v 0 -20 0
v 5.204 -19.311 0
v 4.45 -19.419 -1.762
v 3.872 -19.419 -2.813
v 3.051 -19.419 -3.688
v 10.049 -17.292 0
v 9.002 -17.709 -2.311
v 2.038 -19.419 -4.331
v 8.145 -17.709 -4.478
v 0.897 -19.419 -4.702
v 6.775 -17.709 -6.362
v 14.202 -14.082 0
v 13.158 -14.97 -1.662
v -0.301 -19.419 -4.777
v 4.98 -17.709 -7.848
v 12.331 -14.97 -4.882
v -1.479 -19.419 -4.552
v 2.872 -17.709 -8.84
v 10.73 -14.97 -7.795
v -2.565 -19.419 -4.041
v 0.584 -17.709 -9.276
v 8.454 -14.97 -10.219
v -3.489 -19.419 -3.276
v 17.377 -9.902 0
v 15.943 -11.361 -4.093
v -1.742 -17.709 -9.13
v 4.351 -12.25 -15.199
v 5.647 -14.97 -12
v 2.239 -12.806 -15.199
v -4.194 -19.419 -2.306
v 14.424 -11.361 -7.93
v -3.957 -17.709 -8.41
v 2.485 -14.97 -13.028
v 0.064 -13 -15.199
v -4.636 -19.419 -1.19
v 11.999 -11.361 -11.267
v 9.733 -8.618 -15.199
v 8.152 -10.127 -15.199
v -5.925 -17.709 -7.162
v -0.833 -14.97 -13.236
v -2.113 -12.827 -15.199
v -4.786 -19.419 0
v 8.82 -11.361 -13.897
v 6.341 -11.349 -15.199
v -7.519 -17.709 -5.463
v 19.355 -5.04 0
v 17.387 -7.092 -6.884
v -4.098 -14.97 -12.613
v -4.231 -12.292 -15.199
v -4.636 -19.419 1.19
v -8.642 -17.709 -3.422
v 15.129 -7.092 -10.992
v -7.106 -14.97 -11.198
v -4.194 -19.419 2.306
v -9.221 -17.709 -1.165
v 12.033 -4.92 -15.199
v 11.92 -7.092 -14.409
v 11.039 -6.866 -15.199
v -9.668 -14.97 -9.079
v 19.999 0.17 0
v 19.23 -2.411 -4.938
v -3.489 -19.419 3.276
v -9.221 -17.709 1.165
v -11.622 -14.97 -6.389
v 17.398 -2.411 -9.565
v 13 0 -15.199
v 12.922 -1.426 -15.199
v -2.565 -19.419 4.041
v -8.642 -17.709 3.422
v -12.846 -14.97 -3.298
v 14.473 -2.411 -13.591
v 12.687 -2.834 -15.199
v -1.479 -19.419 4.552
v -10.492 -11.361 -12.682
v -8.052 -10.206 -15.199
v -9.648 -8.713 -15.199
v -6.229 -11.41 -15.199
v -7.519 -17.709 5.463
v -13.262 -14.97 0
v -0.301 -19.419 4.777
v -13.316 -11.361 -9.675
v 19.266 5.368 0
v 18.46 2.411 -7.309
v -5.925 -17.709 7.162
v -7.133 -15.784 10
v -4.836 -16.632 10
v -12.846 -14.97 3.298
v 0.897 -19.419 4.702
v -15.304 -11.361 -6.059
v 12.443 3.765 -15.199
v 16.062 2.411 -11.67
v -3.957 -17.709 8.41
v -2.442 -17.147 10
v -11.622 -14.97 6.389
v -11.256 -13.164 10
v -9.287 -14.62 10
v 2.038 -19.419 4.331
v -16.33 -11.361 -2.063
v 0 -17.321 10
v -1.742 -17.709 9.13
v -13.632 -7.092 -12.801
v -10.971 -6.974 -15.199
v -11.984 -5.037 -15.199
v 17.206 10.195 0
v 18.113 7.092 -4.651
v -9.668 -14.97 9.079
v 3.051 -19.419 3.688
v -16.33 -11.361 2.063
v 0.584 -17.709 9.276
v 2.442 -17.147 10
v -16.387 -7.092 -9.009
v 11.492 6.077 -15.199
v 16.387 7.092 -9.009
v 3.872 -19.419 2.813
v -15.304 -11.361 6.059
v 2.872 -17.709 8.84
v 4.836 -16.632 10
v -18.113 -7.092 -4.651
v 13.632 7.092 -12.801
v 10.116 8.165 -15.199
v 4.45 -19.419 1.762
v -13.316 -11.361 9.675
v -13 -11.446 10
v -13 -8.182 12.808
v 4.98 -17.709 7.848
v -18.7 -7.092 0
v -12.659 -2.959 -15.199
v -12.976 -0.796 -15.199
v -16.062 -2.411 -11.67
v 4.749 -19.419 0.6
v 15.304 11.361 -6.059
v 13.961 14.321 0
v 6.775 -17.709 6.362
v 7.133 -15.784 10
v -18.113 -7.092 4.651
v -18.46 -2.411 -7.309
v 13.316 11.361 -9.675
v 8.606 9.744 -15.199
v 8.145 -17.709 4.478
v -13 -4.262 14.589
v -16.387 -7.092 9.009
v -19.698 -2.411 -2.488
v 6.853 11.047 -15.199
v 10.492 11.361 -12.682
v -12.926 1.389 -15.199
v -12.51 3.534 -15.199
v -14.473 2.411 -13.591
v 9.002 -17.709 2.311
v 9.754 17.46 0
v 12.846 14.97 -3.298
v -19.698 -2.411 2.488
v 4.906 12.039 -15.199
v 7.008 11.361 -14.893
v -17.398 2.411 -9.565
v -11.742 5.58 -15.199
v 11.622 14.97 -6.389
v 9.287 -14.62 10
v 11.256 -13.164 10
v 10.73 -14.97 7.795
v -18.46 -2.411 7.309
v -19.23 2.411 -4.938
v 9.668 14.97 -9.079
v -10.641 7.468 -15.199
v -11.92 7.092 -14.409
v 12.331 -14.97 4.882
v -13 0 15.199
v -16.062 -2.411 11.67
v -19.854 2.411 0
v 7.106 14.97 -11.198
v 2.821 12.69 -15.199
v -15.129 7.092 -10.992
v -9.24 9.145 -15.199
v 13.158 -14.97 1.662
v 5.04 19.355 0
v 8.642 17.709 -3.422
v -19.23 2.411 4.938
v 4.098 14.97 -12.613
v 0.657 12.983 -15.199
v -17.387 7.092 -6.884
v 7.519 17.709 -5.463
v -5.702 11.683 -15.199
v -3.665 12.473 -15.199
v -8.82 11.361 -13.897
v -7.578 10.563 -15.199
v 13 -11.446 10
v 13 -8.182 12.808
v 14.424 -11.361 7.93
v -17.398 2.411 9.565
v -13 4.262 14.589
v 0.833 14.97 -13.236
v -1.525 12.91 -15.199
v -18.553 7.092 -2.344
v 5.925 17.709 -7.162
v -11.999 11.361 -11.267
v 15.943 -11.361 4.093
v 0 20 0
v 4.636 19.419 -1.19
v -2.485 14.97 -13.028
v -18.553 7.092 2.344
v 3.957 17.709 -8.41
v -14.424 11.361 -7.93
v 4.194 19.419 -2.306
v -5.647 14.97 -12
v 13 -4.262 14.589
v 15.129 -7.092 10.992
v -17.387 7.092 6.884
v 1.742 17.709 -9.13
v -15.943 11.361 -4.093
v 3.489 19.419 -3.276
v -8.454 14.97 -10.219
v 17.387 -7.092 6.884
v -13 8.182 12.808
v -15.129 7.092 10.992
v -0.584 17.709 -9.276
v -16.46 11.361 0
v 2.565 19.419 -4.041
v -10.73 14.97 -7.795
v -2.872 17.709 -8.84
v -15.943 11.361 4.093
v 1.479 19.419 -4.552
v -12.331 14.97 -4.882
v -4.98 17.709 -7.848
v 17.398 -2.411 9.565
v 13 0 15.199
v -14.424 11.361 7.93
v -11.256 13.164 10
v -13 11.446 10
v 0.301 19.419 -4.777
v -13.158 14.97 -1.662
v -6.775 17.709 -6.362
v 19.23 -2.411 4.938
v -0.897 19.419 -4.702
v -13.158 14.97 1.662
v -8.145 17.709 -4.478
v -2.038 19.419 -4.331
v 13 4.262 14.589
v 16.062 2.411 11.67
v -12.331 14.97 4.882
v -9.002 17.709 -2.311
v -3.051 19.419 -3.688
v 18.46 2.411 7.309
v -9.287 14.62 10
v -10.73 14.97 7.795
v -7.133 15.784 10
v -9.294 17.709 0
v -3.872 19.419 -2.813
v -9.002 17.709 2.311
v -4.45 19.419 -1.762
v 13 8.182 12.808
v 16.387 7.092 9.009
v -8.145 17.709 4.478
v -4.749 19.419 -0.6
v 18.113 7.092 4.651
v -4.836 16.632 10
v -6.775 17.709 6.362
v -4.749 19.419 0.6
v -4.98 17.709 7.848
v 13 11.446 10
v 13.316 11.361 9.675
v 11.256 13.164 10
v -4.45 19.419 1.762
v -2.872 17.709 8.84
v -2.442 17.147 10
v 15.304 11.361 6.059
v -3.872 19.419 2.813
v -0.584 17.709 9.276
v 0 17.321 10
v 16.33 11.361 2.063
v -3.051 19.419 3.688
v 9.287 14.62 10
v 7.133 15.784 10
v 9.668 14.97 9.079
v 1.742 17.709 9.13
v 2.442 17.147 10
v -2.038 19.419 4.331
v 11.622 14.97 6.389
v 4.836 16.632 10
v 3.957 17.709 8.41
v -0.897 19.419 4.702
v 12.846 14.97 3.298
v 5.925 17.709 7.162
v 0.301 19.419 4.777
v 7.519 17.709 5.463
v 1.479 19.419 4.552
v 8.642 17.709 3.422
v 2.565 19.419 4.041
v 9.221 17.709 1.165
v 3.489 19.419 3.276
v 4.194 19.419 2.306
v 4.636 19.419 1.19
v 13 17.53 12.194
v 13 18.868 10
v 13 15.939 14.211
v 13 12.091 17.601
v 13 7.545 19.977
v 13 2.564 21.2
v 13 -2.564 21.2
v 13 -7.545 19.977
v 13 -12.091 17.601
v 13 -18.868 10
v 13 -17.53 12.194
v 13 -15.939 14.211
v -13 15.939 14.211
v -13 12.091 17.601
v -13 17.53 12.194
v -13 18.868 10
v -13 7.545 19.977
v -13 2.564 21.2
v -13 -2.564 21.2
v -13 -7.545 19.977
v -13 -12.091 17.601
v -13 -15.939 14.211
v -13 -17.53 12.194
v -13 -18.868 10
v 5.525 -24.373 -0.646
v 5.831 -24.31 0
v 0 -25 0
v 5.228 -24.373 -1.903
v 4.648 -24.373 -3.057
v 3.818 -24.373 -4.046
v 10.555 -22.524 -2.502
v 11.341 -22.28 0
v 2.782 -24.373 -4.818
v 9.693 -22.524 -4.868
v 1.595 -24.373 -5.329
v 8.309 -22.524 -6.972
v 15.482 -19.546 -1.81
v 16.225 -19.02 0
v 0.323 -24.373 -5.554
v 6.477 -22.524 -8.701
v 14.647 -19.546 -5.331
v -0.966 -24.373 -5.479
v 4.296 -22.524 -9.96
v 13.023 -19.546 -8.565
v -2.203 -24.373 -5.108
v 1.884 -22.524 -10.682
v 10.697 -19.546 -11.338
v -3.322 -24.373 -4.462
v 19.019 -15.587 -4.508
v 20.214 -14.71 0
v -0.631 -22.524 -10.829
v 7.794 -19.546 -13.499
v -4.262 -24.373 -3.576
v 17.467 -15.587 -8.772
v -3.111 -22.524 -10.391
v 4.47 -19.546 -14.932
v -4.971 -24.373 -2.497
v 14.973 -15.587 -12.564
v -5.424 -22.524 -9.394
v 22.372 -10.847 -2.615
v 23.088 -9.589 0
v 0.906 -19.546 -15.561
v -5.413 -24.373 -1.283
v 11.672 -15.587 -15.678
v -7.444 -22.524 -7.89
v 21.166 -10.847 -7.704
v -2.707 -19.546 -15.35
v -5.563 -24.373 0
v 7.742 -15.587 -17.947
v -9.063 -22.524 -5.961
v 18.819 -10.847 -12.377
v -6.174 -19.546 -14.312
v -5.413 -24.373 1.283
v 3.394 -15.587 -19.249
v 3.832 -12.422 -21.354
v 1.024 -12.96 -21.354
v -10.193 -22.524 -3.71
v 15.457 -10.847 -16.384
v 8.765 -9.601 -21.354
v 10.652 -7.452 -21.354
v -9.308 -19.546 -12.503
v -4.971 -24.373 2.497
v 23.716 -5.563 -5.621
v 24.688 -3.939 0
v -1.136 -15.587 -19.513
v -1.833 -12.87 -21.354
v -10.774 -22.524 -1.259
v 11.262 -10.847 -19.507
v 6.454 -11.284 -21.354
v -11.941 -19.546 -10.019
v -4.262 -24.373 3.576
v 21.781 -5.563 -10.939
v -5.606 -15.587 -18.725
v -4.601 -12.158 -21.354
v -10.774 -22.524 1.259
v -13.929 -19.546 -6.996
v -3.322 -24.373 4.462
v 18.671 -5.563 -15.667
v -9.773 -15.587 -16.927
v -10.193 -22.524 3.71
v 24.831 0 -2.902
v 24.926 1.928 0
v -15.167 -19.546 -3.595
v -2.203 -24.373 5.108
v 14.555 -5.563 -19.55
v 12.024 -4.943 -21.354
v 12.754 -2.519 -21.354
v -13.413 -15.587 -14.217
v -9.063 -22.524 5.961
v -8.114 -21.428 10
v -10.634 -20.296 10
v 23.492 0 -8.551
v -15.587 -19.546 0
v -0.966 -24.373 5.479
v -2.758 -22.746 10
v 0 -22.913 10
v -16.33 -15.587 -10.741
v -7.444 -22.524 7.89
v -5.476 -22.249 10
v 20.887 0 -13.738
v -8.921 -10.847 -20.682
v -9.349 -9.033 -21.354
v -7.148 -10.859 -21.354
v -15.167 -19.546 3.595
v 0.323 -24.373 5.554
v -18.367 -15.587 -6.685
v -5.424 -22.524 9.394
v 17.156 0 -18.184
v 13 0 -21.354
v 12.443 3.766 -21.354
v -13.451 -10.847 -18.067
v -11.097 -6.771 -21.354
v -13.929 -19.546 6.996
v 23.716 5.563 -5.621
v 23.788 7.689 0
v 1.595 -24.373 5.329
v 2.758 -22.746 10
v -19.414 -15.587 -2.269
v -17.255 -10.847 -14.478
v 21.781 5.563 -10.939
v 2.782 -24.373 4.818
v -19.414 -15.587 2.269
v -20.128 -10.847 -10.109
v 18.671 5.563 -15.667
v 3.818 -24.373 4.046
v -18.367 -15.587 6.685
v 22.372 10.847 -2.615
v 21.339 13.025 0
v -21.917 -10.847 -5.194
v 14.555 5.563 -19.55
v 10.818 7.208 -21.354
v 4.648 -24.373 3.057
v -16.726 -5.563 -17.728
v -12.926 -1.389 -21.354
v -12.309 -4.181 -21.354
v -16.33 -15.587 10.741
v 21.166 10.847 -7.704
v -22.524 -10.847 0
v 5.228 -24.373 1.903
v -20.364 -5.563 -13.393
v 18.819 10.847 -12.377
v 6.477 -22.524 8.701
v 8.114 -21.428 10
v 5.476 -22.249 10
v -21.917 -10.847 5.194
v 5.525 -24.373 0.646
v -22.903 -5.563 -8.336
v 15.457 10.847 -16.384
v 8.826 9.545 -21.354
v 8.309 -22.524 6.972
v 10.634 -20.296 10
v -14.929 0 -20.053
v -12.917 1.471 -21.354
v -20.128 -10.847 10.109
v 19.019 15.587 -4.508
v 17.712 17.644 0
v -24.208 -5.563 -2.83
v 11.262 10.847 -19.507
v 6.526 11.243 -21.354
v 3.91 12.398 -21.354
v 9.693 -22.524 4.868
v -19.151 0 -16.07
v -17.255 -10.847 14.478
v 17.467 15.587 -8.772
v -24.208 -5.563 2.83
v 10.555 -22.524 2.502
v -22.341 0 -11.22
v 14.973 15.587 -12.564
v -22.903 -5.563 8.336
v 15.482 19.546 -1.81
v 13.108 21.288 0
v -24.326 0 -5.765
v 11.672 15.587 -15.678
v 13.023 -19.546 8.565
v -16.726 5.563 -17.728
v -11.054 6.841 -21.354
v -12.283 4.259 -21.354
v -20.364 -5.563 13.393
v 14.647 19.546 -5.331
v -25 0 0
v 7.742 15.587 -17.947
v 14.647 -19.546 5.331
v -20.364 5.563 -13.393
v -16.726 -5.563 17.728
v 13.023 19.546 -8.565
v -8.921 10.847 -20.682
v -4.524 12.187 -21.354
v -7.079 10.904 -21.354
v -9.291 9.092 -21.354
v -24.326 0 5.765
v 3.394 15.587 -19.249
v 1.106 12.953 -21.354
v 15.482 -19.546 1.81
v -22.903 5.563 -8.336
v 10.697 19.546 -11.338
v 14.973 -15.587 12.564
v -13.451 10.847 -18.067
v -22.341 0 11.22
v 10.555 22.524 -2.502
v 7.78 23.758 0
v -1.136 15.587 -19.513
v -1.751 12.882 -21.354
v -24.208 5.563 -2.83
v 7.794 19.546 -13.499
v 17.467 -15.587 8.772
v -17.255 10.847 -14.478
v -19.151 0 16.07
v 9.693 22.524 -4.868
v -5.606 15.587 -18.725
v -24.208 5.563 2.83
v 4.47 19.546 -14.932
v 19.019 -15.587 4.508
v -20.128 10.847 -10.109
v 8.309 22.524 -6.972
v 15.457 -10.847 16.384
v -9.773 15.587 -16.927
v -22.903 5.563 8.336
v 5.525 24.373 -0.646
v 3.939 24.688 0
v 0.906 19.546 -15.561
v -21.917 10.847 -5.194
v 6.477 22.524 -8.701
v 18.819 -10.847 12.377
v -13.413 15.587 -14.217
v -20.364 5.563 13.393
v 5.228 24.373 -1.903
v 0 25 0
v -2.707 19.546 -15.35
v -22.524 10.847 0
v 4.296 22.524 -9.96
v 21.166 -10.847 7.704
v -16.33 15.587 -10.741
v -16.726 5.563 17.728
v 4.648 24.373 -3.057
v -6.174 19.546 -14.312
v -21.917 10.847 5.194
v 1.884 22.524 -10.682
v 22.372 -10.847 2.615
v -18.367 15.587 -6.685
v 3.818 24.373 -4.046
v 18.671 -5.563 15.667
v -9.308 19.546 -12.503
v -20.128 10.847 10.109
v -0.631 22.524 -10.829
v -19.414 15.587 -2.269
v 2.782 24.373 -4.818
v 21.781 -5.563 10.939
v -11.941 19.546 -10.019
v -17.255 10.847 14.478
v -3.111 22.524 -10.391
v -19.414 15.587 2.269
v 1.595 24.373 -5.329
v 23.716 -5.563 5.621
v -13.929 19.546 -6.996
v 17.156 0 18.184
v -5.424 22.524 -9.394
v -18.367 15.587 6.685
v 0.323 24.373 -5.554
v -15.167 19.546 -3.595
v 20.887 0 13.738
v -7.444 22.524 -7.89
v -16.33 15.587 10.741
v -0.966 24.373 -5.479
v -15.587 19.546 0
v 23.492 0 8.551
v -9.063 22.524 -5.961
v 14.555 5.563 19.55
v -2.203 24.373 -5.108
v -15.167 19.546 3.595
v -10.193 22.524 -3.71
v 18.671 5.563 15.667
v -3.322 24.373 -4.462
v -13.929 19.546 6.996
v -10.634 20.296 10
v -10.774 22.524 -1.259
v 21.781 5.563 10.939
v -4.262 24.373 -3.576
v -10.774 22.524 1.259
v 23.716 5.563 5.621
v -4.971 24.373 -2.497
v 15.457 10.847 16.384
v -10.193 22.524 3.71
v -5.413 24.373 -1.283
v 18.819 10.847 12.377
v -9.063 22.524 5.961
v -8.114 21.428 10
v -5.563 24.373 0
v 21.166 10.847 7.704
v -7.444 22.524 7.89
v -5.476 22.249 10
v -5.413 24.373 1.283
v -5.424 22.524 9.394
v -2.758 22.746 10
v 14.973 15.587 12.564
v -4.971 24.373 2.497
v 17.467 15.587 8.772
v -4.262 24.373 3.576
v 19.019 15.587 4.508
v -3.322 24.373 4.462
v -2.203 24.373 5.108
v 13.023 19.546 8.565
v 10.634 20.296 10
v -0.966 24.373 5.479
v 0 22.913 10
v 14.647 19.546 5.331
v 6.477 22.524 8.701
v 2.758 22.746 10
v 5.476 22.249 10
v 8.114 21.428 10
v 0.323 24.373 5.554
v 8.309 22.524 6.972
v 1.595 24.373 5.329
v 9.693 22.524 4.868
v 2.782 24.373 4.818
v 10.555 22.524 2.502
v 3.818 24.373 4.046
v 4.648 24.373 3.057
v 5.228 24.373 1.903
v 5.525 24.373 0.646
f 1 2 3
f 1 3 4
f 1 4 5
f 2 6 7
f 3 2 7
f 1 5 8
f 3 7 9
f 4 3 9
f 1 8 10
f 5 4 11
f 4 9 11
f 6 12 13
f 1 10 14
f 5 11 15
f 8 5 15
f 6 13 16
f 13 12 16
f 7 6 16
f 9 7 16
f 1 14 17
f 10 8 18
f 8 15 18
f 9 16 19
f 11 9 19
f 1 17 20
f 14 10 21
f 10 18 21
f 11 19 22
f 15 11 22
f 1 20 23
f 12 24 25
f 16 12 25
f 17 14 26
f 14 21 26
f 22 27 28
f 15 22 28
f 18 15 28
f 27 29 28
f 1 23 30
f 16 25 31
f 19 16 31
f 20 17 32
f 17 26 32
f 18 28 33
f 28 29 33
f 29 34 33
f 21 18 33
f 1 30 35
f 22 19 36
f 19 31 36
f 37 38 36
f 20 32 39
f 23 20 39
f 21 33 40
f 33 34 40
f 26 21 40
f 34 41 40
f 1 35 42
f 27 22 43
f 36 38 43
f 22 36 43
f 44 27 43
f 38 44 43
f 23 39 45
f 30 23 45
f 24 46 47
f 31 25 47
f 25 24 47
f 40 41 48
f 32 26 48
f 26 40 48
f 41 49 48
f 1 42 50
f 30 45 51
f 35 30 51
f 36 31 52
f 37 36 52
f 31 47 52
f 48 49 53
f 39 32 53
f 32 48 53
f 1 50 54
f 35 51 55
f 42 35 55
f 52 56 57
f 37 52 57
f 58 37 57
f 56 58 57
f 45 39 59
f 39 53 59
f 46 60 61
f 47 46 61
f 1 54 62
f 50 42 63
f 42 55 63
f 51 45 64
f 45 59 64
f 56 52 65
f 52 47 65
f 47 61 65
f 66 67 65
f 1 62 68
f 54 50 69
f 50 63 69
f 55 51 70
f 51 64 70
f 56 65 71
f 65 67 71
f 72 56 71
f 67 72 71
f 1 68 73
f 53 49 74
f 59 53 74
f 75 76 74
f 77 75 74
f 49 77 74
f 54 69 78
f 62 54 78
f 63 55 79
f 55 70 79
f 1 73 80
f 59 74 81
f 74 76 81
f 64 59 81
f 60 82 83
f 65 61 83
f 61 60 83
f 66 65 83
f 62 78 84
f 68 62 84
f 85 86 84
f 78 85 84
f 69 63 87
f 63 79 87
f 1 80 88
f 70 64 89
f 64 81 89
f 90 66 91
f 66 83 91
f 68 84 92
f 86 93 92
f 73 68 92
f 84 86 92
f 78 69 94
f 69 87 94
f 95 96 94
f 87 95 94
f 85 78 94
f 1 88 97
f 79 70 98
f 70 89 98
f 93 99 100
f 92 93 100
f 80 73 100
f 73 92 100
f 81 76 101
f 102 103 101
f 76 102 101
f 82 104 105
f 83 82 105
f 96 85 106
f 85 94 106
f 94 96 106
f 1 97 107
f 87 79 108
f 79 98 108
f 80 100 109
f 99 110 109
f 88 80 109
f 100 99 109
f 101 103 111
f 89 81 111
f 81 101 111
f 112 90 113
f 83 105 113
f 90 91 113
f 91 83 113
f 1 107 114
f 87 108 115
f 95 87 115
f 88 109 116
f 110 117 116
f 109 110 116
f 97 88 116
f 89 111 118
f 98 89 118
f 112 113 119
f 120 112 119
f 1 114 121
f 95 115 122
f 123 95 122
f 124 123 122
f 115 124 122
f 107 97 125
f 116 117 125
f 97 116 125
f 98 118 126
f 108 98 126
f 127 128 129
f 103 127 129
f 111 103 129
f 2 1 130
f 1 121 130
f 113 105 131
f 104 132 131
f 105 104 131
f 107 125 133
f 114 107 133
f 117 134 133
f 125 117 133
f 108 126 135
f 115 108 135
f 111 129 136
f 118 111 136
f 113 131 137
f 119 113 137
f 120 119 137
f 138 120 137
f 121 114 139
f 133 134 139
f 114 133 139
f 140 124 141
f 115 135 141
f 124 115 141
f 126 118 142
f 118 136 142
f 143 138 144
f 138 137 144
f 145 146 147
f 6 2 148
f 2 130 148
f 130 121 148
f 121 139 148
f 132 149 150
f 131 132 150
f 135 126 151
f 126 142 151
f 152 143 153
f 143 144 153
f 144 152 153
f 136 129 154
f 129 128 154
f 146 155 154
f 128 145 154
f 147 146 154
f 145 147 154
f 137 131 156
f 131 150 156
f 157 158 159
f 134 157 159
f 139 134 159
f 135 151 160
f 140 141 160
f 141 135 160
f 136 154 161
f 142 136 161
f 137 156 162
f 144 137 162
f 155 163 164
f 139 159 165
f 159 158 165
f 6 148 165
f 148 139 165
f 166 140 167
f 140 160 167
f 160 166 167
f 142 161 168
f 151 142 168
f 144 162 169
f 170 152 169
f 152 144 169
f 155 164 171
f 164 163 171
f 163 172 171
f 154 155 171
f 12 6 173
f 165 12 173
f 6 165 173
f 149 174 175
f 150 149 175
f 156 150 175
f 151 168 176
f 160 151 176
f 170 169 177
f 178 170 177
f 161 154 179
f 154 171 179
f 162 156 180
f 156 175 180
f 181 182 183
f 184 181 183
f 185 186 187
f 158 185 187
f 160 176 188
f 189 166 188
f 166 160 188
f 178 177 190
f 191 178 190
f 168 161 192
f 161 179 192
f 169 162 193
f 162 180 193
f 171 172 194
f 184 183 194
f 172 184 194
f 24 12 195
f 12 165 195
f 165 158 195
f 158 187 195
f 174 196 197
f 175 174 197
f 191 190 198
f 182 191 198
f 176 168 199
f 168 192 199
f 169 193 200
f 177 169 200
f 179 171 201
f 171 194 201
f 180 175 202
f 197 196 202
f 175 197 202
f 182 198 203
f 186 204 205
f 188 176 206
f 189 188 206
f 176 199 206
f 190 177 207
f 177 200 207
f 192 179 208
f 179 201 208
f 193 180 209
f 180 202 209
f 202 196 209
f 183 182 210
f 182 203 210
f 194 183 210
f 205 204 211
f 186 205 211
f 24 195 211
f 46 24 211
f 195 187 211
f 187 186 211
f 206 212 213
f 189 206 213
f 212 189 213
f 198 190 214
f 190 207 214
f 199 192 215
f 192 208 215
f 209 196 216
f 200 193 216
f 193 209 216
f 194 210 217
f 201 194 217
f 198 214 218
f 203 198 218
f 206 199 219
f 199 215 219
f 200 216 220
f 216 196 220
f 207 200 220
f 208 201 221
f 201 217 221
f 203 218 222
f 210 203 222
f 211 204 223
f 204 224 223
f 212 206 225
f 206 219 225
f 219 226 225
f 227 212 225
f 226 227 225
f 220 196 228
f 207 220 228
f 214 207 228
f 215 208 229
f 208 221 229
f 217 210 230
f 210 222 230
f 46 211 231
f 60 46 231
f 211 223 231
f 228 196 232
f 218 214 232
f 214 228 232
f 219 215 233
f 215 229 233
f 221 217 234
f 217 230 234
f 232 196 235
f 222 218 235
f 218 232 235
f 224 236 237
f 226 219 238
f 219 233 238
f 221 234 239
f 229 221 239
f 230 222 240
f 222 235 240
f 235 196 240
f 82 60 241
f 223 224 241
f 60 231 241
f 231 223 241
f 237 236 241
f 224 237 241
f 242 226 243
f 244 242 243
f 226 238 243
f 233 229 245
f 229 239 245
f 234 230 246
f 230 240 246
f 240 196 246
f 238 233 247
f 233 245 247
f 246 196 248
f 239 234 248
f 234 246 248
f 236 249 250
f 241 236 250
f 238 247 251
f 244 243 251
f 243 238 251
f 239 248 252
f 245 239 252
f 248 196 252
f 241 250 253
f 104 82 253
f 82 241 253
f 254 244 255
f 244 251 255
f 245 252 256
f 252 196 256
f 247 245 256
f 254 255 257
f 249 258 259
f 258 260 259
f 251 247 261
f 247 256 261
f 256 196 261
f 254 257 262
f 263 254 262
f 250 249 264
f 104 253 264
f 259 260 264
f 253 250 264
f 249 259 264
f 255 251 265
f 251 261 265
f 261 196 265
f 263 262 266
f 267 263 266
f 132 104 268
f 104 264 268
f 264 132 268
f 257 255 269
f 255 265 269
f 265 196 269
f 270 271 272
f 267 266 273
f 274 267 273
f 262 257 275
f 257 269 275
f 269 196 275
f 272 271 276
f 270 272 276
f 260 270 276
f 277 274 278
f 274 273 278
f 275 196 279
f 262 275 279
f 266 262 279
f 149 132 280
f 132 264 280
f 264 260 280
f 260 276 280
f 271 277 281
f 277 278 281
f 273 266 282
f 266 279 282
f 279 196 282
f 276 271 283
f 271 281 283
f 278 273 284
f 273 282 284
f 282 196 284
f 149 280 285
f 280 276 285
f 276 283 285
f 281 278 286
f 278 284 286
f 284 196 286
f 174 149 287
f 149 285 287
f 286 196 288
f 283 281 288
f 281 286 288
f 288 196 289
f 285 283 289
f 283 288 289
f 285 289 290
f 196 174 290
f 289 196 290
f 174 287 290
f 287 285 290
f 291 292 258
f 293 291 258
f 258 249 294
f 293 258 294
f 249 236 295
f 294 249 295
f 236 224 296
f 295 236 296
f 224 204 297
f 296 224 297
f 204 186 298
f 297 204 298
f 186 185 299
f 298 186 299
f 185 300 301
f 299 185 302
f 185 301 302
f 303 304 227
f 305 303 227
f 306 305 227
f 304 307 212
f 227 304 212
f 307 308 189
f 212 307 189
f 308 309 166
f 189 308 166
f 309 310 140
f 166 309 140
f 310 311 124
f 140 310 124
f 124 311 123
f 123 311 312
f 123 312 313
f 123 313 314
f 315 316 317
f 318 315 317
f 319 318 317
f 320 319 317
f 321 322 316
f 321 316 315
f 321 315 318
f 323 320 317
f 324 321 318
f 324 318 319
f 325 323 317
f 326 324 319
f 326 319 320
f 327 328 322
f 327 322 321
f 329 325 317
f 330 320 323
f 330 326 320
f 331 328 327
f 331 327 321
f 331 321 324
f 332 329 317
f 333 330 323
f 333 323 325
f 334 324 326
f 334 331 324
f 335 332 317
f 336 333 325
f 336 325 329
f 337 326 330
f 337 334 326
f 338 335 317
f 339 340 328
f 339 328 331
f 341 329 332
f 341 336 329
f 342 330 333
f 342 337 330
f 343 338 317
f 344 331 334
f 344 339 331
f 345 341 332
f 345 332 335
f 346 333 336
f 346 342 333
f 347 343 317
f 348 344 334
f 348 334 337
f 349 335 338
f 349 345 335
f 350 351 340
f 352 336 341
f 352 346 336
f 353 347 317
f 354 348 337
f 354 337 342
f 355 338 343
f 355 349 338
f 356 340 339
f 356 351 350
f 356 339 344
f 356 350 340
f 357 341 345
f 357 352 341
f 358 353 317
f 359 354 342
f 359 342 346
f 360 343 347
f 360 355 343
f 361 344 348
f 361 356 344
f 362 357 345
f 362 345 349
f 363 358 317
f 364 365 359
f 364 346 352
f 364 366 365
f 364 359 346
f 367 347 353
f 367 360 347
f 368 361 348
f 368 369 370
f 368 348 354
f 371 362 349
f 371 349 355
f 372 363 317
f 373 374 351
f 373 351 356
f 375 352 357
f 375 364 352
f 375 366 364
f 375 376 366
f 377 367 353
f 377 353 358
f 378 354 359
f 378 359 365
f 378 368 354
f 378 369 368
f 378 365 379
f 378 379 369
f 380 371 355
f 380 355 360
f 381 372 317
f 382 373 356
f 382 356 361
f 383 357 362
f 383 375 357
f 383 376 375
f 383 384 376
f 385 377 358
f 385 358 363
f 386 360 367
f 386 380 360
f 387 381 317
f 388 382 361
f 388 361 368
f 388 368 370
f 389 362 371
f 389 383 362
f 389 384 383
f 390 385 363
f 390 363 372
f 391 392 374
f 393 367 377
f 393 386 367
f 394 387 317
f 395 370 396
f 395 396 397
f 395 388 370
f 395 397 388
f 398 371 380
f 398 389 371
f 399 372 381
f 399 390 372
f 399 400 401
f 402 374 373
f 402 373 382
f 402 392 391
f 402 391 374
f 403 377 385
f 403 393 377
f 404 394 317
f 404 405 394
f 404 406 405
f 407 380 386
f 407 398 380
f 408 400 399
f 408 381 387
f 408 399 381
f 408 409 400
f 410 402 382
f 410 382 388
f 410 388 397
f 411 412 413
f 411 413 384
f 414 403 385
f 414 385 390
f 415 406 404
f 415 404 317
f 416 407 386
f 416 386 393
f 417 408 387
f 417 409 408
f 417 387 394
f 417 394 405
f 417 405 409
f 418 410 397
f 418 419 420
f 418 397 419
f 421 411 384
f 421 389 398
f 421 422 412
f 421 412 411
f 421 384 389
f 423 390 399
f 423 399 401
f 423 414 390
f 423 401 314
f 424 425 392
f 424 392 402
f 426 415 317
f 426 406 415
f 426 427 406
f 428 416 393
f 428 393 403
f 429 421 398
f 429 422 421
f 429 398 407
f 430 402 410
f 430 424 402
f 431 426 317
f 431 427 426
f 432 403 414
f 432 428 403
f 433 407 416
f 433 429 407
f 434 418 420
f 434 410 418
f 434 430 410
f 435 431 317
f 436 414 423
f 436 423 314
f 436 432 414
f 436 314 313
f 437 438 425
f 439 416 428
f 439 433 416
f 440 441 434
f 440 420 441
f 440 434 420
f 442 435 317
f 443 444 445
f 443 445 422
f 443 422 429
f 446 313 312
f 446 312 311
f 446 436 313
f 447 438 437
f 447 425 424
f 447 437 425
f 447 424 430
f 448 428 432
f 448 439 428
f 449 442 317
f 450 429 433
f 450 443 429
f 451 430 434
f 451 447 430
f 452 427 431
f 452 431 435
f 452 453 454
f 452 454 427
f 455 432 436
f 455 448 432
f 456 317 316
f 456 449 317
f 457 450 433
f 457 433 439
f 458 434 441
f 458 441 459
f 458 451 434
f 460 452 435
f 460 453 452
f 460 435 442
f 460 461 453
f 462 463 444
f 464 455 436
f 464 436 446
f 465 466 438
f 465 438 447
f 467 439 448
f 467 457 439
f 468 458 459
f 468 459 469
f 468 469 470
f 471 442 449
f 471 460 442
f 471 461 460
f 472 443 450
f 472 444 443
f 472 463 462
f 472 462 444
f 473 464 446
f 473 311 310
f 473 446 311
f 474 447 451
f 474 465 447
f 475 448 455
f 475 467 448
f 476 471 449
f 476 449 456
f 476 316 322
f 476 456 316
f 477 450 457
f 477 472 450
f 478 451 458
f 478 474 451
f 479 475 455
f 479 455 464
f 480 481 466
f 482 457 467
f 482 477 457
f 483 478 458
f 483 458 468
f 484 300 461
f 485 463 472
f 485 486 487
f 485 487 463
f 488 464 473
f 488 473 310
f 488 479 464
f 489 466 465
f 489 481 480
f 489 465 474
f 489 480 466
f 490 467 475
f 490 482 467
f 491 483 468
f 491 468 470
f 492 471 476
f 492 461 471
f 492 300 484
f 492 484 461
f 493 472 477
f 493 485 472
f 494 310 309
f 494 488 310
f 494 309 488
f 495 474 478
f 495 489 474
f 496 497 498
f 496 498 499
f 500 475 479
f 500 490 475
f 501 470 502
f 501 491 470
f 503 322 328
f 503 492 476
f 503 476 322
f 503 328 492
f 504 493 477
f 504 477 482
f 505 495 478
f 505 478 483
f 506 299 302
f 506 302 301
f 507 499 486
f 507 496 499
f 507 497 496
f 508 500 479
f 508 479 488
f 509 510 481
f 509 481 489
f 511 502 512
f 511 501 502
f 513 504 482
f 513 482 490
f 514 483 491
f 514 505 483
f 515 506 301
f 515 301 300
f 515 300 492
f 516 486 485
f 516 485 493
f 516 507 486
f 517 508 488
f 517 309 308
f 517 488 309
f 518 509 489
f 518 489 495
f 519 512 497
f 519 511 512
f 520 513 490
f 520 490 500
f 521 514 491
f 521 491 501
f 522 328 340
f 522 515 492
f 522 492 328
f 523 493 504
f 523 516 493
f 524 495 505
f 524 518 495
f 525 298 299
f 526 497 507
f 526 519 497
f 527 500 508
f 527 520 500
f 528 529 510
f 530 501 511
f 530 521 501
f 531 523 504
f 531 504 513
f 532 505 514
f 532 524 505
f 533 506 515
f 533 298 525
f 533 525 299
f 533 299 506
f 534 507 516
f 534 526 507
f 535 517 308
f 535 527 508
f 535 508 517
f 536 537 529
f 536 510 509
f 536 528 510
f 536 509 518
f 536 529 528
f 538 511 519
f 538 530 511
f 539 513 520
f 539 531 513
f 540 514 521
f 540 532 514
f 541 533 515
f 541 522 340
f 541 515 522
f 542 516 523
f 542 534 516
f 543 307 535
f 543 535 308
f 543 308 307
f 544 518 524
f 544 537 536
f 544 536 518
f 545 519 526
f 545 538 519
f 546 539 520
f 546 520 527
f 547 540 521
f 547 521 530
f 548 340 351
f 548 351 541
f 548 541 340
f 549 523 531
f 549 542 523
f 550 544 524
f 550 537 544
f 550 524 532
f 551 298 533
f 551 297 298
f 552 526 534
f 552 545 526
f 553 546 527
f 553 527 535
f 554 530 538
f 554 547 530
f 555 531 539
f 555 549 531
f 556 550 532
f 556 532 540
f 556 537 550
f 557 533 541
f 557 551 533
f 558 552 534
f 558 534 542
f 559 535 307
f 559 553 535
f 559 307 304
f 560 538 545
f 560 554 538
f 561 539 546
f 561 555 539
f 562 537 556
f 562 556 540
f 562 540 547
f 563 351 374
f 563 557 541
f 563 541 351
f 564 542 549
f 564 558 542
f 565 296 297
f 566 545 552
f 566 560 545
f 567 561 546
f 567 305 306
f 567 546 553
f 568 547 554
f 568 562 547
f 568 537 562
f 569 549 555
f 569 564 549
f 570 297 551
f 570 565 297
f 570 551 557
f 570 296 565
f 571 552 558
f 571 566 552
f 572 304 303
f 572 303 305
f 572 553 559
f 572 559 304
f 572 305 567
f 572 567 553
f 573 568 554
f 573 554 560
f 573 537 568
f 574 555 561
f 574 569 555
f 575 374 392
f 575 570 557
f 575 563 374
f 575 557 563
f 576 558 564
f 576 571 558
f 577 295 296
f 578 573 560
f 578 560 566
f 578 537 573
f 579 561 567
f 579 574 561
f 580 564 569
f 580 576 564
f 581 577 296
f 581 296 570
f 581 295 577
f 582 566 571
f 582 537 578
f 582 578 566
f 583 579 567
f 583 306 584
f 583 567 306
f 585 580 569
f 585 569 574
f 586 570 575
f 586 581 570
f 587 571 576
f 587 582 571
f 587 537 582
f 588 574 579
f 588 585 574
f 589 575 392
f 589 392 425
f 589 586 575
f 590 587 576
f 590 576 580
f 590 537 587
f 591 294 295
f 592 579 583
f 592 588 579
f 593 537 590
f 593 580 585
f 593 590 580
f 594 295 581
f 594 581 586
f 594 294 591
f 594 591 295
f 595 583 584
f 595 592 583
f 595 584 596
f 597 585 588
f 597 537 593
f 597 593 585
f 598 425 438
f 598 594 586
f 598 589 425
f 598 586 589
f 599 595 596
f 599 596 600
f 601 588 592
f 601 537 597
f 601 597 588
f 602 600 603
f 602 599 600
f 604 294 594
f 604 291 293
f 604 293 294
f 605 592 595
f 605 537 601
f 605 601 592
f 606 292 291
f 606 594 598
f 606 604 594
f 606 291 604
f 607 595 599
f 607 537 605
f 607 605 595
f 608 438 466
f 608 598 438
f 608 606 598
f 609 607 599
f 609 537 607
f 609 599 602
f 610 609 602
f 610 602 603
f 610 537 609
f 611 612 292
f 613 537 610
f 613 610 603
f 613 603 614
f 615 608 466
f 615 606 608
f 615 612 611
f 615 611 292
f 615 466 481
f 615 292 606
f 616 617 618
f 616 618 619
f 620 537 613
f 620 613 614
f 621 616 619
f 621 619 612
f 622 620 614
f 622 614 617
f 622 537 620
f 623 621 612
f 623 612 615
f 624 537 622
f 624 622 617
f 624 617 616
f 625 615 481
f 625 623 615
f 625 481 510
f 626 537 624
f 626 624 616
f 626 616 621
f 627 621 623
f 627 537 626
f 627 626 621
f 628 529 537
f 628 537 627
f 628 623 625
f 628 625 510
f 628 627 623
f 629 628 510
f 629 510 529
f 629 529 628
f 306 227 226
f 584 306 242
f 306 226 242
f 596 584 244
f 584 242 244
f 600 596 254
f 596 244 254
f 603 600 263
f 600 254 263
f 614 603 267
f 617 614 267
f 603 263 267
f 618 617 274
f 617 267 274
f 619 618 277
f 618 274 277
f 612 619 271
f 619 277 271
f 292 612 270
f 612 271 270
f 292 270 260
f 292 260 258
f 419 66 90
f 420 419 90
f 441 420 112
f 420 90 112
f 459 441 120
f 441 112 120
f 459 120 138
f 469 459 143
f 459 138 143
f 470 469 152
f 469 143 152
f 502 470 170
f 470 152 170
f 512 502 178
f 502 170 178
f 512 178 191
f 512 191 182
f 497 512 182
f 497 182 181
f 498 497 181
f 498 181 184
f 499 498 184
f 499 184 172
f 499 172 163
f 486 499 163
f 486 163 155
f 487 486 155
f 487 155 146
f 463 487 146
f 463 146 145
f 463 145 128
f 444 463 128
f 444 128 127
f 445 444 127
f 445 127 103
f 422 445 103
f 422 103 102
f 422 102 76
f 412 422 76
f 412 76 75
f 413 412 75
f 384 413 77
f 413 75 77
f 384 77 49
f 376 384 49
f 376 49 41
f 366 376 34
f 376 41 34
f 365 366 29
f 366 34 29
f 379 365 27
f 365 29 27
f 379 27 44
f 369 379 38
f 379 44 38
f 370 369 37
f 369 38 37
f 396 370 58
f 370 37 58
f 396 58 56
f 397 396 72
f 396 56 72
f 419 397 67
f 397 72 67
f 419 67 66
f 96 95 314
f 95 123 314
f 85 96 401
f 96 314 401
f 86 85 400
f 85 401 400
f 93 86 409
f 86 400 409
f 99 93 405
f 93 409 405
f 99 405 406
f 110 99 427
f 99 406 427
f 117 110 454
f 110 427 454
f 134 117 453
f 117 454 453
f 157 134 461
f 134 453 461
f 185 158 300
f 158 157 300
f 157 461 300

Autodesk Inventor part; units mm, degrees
ref_plane "YZ Plane" through (0, 0, 0) normal (1, 0, 0) x (0, 1, 0)
ref_plane "XZ Plane" through (0, 0, 0) normal (0, 1, 0) x (-1, 0, 0)
ref_plane "XY Plane" through (0, 0, 0) normal (0, 0, 1) x (1, 0, 0)
sketch "Эскиз1" plane through (0, 0, 0) normal (0, 0, 1) x (1, 0, 0)
  arc A0 (0, -25) -> (0, 25) centre (0, 0) ccw
  arc A1 (0, -20) -> (0, 20) centre (0, 0) ccw
  line L0 (0, 25) -> (0, 20)
  line L1 (0, -20) -> (0, -25)
  line L2 (0, -35) -> (0, 35) projected
  dimension "d0" = 20
  dimension "d1" = 25
revolve "Вращение1" add sketch "Эскиз1" angle 360 about axis through (0, -10, 0) along (0, 1, 0) contours L1 A1 L0 A0
sketch "Эскиз2" plane through (0, 0, 0) normal (0, 0, 1) x (1, 0, 0)
  circle A0 centre (0, 0) radius 13
  dimension "d3" = 26
extrude "Выдавливание1" cut sketch "Эскиз2" against normal through all
sketch "Эскиз3" plane through (0, 0, 0) normal (0, 1, 0) x (-1, 0, 0)
  arc A0 (13, -21.3542) -> (-13, -21.3542) centre (0, 0) ccw projected
  line L0 (13, 10) -> (-13, 10)
  line L1 (-13, 10) -> (-13, 25)
  line L2 (-13, 25) -> (13, 25)
  line L3 (13, 25) -> (13, 10)
  dimension "d6" = 10
  dimension "d7" = 26
  dimension "d9" = 13
extrude "Выдавливание2" cut sketch "Эскиз3" along normal through all both and the other way through all
